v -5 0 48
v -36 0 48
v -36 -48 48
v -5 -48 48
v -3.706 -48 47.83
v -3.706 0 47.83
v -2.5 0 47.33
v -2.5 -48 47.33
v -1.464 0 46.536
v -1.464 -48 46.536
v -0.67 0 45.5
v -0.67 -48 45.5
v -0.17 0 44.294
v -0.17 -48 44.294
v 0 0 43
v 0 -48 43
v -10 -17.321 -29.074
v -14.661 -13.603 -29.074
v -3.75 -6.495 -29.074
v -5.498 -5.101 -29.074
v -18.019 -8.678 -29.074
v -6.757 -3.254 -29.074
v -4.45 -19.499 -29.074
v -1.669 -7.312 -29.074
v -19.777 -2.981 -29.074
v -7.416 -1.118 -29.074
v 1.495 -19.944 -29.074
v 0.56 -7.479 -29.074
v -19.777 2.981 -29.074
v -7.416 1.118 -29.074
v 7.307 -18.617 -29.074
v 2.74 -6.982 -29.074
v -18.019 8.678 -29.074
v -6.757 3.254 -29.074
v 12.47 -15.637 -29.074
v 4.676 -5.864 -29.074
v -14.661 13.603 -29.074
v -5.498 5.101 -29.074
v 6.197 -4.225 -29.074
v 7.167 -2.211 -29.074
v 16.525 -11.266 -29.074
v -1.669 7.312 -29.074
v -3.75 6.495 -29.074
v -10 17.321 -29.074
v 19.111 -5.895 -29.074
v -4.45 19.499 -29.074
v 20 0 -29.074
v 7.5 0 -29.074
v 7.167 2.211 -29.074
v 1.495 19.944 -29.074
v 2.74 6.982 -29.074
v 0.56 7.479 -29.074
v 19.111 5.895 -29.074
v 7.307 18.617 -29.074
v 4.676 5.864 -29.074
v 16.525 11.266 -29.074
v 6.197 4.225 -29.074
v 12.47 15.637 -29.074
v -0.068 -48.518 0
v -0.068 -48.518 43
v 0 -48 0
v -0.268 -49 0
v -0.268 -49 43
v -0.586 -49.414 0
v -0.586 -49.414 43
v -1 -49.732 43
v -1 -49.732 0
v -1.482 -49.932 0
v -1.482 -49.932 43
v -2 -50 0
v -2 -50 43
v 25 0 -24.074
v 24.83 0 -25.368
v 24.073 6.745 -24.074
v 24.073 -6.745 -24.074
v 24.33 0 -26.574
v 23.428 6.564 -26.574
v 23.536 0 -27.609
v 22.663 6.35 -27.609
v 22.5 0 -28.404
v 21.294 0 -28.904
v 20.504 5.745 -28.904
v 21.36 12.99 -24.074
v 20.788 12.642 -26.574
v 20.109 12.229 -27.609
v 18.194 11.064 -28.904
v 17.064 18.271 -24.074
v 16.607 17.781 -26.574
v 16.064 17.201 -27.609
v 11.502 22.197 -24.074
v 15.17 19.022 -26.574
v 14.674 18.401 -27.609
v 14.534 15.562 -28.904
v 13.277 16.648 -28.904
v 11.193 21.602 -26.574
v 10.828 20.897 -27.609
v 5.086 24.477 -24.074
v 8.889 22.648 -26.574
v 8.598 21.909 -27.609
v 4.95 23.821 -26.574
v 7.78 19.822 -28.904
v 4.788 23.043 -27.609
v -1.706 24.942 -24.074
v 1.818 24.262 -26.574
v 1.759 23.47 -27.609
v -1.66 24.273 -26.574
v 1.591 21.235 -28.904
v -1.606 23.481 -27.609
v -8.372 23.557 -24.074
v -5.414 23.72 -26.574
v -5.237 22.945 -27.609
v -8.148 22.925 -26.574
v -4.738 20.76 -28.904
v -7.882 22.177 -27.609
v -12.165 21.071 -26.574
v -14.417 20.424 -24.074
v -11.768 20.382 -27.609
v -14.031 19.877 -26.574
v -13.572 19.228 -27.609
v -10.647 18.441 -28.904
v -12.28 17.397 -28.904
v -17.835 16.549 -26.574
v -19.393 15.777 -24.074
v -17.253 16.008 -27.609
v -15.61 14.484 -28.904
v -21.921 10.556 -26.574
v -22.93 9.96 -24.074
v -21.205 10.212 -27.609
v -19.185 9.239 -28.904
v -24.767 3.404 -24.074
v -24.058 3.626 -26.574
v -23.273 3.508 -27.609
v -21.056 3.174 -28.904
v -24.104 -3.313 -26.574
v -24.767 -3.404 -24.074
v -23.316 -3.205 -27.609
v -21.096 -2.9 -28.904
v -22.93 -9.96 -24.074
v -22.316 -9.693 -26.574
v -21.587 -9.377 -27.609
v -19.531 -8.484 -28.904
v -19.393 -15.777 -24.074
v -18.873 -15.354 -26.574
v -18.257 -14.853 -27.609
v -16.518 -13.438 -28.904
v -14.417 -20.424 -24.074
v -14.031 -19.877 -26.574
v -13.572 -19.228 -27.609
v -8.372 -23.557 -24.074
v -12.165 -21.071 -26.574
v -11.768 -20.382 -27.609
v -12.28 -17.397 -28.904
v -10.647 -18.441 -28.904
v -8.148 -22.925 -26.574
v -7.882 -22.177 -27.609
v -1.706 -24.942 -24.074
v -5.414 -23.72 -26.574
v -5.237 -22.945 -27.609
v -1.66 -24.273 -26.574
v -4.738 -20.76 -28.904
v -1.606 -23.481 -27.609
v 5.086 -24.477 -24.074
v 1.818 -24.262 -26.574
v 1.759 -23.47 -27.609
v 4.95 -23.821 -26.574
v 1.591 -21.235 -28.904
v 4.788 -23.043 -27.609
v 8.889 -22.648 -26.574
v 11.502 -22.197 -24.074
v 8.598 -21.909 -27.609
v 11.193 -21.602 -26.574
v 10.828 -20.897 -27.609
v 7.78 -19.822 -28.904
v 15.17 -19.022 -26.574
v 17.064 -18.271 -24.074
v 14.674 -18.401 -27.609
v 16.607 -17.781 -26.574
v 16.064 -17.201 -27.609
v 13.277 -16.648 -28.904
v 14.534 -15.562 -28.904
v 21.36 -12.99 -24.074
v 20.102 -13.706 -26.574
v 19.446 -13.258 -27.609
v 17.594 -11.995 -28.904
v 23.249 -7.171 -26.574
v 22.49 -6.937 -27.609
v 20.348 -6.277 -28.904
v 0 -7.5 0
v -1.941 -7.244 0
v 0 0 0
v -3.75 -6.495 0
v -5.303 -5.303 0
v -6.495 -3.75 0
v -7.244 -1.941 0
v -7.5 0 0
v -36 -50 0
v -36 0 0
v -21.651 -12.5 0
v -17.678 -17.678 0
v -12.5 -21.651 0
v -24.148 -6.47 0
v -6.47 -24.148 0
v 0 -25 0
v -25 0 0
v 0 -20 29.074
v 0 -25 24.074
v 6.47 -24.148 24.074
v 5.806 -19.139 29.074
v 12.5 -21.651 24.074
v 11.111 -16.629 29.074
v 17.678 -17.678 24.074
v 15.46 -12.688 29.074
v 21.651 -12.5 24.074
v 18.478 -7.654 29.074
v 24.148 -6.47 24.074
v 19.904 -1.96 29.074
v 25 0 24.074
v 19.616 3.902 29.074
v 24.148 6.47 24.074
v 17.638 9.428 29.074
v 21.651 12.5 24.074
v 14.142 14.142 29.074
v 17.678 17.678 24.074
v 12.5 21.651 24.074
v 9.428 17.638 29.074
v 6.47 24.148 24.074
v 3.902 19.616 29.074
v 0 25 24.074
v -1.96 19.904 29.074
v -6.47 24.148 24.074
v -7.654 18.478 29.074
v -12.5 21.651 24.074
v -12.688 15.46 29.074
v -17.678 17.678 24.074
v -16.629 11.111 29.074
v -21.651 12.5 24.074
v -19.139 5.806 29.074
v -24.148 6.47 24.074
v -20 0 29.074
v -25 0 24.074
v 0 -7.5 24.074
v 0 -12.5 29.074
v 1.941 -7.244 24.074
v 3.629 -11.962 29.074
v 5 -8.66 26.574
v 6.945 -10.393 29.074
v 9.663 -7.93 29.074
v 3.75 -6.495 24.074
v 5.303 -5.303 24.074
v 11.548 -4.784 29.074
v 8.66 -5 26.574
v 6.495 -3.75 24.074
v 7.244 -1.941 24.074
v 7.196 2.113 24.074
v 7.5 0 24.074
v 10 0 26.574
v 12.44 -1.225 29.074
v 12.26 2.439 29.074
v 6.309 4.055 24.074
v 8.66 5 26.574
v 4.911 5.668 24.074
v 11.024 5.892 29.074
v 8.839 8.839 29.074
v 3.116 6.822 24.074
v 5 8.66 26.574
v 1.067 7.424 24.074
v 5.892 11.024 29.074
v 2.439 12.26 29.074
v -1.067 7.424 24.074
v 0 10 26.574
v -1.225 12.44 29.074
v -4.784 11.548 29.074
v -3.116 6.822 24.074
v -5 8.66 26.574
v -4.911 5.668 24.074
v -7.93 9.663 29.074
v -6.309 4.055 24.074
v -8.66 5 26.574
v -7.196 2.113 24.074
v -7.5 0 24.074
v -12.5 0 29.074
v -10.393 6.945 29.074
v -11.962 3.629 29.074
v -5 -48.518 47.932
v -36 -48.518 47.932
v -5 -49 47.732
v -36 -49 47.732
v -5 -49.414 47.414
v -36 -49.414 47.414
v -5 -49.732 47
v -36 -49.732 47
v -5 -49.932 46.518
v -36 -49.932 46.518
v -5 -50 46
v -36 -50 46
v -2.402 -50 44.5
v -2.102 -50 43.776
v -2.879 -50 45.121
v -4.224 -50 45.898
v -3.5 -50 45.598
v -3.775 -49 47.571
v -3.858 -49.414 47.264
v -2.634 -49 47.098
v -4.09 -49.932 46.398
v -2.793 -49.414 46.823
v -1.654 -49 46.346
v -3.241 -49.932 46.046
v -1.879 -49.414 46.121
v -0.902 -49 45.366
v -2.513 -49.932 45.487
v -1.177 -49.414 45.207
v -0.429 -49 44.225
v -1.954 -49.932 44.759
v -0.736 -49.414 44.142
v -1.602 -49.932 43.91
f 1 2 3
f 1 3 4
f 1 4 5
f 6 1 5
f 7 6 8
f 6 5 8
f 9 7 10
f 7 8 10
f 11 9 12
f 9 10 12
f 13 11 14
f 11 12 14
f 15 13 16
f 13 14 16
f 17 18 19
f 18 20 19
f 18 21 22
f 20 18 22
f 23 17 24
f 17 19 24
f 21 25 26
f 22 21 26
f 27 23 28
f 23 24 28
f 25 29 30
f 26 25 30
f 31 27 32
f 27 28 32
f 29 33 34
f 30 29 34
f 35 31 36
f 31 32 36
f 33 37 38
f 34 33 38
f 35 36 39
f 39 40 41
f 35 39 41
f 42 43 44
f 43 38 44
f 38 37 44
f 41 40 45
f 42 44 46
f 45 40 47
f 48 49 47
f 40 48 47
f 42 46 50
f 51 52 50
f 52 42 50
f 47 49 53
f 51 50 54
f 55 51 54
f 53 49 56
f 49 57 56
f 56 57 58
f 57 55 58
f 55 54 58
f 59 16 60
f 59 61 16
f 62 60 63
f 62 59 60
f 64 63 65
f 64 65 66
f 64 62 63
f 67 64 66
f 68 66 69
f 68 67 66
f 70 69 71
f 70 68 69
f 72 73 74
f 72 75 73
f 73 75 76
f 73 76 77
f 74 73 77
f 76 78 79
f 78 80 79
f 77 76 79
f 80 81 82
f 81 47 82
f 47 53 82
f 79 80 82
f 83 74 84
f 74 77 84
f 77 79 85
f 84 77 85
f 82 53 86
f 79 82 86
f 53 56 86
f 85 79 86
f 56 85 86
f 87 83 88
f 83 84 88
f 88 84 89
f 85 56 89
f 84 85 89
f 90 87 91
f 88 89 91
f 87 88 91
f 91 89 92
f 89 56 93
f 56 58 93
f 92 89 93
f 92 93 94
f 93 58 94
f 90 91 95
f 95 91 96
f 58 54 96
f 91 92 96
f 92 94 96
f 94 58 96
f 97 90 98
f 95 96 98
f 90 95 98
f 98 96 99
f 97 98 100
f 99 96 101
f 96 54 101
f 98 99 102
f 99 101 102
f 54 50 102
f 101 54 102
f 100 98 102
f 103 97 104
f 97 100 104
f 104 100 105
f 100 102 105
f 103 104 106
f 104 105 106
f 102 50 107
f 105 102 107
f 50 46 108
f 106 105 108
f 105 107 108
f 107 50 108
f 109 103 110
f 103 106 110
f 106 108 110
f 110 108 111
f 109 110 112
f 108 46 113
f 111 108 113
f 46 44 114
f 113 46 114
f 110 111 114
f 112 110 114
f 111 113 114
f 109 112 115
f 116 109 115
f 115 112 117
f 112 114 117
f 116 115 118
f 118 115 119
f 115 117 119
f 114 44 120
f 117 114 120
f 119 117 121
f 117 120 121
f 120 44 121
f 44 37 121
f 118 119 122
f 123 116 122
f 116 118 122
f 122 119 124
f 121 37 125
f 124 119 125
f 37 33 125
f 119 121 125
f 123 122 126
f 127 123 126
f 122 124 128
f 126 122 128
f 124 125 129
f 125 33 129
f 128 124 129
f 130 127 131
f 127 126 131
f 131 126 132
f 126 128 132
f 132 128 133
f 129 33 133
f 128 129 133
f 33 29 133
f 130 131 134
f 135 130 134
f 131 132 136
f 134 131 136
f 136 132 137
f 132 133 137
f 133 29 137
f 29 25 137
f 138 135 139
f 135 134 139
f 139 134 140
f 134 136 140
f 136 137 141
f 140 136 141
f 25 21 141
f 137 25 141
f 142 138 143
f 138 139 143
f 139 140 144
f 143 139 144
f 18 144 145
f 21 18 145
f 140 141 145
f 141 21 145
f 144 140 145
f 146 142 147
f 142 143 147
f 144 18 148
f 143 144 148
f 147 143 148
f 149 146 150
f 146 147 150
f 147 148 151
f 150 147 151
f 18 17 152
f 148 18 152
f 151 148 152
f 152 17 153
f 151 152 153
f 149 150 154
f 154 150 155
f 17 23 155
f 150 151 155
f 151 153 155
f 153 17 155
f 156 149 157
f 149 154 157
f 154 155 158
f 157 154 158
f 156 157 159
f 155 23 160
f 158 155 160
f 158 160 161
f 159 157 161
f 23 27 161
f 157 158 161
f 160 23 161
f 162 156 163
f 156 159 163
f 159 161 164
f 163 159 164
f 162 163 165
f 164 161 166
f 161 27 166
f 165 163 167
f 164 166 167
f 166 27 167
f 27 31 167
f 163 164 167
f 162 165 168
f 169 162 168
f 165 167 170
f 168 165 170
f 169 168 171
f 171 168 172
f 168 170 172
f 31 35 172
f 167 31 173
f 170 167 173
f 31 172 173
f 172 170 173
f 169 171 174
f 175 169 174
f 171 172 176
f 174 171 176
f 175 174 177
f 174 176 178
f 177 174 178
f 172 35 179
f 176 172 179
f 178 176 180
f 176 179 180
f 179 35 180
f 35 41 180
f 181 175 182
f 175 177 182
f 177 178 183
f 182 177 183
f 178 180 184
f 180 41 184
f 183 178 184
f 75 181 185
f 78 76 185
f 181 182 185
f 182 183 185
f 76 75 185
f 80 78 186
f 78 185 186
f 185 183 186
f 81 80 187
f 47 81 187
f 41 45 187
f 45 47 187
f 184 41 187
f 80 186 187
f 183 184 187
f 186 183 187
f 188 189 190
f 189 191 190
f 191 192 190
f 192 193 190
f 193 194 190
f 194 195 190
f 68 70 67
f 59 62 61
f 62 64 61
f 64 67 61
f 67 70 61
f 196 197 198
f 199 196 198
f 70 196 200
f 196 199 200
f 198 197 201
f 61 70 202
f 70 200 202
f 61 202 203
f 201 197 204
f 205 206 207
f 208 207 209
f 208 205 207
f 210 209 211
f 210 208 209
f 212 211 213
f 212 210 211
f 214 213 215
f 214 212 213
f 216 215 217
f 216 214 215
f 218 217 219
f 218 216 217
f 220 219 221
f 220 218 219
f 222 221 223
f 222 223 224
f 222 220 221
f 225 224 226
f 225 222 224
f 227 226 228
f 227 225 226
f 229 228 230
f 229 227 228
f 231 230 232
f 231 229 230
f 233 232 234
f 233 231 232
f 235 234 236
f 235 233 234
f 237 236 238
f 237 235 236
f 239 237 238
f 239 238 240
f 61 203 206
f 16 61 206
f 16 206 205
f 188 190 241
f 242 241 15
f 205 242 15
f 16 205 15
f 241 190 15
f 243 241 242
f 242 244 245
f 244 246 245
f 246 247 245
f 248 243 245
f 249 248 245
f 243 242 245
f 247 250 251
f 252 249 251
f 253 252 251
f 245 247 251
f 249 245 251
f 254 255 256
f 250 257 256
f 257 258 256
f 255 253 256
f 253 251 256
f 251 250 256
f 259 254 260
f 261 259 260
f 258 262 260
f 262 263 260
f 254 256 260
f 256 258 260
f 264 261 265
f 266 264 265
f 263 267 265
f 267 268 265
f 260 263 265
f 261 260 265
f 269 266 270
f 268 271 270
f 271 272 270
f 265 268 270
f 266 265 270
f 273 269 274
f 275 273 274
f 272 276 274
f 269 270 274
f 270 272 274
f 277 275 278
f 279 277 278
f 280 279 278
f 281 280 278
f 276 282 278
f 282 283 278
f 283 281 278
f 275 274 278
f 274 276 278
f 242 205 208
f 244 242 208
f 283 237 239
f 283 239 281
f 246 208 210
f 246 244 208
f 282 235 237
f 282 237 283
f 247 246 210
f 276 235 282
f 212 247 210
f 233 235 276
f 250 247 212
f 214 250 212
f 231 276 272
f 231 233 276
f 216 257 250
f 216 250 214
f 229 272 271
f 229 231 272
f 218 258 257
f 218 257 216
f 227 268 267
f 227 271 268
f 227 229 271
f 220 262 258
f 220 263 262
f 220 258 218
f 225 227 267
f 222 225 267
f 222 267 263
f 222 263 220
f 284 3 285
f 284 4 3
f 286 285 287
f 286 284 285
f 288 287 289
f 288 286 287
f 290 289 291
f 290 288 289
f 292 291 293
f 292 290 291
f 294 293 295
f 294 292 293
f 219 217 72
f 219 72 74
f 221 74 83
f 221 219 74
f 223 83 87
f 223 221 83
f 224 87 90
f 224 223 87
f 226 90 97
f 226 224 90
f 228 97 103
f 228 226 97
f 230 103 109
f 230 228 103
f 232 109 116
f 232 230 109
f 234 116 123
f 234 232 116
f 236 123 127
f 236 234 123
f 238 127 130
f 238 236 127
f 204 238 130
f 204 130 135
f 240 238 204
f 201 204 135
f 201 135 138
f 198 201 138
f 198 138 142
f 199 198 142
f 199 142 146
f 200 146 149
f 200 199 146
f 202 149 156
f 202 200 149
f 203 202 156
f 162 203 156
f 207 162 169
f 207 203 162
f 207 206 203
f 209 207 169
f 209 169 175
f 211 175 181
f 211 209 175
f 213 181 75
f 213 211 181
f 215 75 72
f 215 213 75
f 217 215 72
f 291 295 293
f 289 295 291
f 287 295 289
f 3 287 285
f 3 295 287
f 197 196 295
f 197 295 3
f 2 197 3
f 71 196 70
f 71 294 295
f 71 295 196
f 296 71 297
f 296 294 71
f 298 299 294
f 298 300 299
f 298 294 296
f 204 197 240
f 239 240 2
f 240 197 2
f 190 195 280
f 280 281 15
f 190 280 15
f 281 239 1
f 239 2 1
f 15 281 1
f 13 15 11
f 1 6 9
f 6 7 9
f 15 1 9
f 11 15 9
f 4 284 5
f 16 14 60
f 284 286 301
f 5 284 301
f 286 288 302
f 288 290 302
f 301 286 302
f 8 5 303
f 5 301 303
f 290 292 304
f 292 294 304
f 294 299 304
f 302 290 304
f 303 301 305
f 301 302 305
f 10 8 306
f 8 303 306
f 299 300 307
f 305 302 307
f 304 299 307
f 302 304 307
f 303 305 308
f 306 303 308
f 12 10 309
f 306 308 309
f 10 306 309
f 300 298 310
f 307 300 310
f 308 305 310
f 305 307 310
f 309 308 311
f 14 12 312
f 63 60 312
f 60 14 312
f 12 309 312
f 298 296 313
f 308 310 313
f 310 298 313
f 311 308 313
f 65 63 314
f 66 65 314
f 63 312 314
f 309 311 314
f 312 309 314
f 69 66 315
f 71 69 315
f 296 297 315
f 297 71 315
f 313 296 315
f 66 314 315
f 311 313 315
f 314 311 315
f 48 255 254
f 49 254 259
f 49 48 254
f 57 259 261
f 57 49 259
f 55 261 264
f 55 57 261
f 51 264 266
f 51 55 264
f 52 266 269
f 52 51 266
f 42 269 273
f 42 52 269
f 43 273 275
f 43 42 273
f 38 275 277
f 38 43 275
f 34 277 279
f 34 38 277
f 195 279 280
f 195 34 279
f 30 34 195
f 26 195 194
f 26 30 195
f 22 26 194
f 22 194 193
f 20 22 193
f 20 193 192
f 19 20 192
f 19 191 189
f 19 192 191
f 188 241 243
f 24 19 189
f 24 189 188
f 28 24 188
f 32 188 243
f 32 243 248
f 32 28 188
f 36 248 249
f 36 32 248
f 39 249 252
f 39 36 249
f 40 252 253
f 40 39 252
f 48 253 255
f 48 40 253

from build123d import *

# Parameters (mm, degrees)
F0_R     = 25
F0_R_2   = 7.5
F1_DEPTH = 29.07393
F2_W     = 36
F2_H     = 48
F3_DEPTH = 50
F4_SIZE  = 5
F5_R     = 5
F6_R     = 2
F7_R     = 5


with BuildPart() as f1:
    # F0 (on Top) → F1 (new body, symmetric)
    with BuildSketch(Plane.XY):
        Circle(F0_R)
        Circle(F0_R_2, mode=Mode.SUBTRACT)
    extrude(amount=F1_DEPTH, both=True)

    # F2 (on Front) → F3 (join)
    with BuildSketch(Plane.XZ):
        with Locations((-18, 24)):
            Rectangle(F2_W, F2_H)
    extrude(amount=F3_DEPTH)

    # F4
    f4_edges = [f1.edges().sort_by_distance(p)[0] for p in [
        (0, 25, 29.07393),
        (0, 7.5, 29.07393),
    ]]
    chamfer(f4_edges, length=F4_SIZE)

    # F5
    f5_edges = [f1.edges().sort_by_distance(p)[0] for p in [
        (0, -25, 48),
    ]]
    fillet(f5_edges, radius=F5_R)

    # F6
    f6_edges = [f1.edges().sort_by_distance(p)[0] for p in [
        (-20.5, -50, 48),
    ]]
    fillet(f6_edges, radius=F6_R)

    # F7
    f7_edges = [f1.edges().sort_by_distance(p)[0] for p in [
        (-25, 0, -29.07393),
    ]]
    fillet(f7_edges, radius=F7_R)


solid = f1.part
